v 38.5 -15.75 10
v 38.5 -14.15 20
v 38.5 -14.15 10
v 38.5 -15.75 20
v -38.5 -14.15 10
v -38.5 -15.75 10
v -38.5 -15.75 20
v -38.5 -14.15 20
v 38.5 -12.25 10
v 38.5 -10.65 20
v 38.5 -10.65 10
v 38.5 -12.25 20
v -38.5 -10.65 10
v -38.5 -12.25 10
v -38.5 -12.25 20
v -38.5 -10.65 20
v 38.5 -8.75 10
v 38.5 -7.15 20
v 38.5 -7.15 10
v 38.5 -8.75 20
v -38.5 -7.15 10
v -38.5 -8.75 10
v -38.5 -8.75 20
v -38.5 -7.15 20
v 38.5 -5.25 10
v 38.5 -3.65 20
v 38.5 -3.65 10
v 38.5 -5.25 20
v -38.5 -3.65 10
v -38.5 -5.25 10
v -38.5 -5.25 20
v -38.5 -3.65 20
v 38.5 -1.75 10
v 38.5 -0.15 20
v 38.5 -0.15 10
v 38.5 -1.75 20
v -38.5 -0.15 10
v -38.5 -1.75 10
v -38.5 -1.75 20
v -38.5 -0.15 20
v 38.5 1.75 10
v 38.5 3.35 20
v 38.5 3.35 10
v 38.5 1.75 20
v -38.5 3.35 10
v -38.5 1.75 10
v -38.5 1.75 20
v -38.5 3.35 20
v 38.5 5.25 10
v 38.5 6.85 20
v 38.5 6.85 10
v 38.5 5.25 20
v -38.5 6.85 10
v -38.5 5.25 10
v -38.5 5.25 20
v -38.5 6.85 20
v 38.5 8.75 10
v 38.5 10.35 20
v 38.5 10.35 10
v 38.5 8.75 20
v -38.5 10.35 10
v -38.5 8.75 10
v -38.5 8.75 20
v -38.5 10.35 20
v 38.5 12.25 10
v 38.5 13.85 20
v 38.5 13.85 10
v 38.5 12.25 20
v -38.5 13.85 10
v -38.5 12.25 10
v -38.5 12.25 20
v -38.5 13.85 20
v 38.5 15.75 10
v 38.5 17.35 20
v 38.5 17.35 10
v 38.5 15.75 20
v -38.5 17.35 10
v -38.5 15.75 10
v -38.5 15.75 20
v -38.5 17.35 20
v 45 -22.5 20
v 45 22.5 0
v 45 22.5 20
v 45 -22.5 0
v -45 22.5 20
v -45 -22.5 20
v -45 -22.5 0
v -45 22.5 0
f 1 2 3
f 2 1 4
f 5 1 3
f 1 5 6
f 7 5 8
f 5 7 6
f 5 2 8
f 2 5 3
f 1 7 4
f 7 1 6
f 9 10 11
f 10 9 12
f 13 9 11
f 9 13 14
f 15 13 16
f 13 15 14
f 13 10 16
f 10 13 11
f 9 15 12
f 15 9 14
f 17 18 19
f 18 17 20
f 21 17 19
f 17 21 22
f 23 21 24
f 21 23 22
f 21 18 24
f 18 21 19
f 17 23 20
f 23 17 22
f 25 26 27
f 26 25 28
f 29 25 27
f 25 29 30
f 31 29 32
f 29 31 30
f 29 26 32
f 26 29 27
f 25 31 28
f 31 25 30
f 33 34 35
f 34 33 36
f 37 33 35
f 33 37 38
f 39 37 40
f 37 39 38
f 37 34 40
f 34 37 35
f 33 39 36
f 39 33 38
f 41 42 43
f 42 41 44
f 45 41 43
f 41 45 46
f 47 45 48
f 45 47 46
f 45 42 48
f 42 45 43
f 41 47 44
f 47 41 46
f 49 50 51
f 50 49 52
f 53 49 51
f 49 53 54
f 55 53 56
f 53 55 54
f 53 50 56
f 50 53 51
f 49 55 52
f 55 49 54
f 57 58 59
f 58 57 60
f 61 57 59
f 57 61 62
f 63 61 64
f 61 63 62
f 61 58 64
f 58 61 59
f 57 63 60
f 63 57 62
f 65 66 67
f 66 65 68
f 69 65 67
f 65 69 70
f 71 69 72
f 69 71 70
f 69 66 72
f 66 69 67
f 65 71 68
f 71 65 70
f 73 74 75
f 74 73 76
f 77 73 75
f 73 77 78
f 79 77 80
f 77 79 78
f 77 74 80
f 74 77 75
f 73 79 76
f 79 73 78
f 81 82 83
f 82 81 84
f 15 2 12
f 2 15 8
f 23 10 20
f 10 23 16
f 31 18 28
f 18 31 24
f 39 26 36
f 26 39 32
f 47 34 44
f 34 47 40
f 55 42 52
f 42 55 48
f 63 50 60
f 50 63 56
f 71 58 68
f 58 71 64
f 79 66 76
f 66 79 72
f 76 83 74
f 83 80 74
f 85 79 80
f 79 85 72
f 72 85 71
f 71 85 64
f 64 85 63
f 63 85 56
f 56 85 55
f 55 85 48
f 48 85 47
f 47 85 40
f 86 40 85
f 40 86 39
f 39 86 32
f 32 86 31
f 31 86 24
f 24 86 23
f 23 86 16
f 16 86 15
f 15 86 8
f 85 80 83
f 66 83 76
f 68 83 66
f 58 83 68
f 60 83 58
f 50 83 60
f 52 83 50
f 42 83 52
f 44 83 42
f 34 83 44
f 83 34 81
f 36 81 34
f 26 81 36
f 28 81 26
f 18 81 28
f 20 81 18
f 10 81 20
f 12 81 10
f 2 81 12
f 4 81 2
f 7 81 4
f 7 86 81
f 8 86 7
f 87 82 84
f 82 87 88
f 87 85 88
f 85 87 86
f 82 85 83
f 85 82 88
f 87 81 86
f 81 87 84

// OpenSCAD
// Microscope slide drying rack
// Units: mm. Print orientation: base on XY plane, slots open upward (+Z).

// ---------- Block ----------
block_len   = 90;    // block length along X
block_wid   = 45;    // block width along Y
block_ht    = 20;    // block height along Z

// ---------- Slots ----------
slot_count  = 10;    // number of slide slots
slot_len    = 77;    // slot length along X (slightly > slide 75 mm)
slot_wid    = 1.6;   // slot width along Y
slot_depth  = 10;    // slot depth from top face (Z)
slot_pitch  = 3.5;   // centre-to-centre spacing along Y

// ---------- Misc ----------
eps         = 0.5;   // overshoot for clean boolean cuts
$fn         = 64;    // curve resolution (no curved features, set per rules)

// Slot group width (first centre to last centre)
slot_group_wid = (slot_count - 1) * slot_pitch;

difference() {
    // Base block, centred in X and Y
    translate([-block_len/2, -block_wid/2, 0])
        cube([block_len, block_wid, block_ht]);

    // Parallel slots, open at the top
    for (i = [0 : slot_count - 1]) {
        y = -slot_group_wid/2 + i * slot_pitch;
        translate([-slot_len/2, y, block_ht - slot_depth])
            cube([slot_len, slot_wid, slot_depth + eps]);
    }
}
